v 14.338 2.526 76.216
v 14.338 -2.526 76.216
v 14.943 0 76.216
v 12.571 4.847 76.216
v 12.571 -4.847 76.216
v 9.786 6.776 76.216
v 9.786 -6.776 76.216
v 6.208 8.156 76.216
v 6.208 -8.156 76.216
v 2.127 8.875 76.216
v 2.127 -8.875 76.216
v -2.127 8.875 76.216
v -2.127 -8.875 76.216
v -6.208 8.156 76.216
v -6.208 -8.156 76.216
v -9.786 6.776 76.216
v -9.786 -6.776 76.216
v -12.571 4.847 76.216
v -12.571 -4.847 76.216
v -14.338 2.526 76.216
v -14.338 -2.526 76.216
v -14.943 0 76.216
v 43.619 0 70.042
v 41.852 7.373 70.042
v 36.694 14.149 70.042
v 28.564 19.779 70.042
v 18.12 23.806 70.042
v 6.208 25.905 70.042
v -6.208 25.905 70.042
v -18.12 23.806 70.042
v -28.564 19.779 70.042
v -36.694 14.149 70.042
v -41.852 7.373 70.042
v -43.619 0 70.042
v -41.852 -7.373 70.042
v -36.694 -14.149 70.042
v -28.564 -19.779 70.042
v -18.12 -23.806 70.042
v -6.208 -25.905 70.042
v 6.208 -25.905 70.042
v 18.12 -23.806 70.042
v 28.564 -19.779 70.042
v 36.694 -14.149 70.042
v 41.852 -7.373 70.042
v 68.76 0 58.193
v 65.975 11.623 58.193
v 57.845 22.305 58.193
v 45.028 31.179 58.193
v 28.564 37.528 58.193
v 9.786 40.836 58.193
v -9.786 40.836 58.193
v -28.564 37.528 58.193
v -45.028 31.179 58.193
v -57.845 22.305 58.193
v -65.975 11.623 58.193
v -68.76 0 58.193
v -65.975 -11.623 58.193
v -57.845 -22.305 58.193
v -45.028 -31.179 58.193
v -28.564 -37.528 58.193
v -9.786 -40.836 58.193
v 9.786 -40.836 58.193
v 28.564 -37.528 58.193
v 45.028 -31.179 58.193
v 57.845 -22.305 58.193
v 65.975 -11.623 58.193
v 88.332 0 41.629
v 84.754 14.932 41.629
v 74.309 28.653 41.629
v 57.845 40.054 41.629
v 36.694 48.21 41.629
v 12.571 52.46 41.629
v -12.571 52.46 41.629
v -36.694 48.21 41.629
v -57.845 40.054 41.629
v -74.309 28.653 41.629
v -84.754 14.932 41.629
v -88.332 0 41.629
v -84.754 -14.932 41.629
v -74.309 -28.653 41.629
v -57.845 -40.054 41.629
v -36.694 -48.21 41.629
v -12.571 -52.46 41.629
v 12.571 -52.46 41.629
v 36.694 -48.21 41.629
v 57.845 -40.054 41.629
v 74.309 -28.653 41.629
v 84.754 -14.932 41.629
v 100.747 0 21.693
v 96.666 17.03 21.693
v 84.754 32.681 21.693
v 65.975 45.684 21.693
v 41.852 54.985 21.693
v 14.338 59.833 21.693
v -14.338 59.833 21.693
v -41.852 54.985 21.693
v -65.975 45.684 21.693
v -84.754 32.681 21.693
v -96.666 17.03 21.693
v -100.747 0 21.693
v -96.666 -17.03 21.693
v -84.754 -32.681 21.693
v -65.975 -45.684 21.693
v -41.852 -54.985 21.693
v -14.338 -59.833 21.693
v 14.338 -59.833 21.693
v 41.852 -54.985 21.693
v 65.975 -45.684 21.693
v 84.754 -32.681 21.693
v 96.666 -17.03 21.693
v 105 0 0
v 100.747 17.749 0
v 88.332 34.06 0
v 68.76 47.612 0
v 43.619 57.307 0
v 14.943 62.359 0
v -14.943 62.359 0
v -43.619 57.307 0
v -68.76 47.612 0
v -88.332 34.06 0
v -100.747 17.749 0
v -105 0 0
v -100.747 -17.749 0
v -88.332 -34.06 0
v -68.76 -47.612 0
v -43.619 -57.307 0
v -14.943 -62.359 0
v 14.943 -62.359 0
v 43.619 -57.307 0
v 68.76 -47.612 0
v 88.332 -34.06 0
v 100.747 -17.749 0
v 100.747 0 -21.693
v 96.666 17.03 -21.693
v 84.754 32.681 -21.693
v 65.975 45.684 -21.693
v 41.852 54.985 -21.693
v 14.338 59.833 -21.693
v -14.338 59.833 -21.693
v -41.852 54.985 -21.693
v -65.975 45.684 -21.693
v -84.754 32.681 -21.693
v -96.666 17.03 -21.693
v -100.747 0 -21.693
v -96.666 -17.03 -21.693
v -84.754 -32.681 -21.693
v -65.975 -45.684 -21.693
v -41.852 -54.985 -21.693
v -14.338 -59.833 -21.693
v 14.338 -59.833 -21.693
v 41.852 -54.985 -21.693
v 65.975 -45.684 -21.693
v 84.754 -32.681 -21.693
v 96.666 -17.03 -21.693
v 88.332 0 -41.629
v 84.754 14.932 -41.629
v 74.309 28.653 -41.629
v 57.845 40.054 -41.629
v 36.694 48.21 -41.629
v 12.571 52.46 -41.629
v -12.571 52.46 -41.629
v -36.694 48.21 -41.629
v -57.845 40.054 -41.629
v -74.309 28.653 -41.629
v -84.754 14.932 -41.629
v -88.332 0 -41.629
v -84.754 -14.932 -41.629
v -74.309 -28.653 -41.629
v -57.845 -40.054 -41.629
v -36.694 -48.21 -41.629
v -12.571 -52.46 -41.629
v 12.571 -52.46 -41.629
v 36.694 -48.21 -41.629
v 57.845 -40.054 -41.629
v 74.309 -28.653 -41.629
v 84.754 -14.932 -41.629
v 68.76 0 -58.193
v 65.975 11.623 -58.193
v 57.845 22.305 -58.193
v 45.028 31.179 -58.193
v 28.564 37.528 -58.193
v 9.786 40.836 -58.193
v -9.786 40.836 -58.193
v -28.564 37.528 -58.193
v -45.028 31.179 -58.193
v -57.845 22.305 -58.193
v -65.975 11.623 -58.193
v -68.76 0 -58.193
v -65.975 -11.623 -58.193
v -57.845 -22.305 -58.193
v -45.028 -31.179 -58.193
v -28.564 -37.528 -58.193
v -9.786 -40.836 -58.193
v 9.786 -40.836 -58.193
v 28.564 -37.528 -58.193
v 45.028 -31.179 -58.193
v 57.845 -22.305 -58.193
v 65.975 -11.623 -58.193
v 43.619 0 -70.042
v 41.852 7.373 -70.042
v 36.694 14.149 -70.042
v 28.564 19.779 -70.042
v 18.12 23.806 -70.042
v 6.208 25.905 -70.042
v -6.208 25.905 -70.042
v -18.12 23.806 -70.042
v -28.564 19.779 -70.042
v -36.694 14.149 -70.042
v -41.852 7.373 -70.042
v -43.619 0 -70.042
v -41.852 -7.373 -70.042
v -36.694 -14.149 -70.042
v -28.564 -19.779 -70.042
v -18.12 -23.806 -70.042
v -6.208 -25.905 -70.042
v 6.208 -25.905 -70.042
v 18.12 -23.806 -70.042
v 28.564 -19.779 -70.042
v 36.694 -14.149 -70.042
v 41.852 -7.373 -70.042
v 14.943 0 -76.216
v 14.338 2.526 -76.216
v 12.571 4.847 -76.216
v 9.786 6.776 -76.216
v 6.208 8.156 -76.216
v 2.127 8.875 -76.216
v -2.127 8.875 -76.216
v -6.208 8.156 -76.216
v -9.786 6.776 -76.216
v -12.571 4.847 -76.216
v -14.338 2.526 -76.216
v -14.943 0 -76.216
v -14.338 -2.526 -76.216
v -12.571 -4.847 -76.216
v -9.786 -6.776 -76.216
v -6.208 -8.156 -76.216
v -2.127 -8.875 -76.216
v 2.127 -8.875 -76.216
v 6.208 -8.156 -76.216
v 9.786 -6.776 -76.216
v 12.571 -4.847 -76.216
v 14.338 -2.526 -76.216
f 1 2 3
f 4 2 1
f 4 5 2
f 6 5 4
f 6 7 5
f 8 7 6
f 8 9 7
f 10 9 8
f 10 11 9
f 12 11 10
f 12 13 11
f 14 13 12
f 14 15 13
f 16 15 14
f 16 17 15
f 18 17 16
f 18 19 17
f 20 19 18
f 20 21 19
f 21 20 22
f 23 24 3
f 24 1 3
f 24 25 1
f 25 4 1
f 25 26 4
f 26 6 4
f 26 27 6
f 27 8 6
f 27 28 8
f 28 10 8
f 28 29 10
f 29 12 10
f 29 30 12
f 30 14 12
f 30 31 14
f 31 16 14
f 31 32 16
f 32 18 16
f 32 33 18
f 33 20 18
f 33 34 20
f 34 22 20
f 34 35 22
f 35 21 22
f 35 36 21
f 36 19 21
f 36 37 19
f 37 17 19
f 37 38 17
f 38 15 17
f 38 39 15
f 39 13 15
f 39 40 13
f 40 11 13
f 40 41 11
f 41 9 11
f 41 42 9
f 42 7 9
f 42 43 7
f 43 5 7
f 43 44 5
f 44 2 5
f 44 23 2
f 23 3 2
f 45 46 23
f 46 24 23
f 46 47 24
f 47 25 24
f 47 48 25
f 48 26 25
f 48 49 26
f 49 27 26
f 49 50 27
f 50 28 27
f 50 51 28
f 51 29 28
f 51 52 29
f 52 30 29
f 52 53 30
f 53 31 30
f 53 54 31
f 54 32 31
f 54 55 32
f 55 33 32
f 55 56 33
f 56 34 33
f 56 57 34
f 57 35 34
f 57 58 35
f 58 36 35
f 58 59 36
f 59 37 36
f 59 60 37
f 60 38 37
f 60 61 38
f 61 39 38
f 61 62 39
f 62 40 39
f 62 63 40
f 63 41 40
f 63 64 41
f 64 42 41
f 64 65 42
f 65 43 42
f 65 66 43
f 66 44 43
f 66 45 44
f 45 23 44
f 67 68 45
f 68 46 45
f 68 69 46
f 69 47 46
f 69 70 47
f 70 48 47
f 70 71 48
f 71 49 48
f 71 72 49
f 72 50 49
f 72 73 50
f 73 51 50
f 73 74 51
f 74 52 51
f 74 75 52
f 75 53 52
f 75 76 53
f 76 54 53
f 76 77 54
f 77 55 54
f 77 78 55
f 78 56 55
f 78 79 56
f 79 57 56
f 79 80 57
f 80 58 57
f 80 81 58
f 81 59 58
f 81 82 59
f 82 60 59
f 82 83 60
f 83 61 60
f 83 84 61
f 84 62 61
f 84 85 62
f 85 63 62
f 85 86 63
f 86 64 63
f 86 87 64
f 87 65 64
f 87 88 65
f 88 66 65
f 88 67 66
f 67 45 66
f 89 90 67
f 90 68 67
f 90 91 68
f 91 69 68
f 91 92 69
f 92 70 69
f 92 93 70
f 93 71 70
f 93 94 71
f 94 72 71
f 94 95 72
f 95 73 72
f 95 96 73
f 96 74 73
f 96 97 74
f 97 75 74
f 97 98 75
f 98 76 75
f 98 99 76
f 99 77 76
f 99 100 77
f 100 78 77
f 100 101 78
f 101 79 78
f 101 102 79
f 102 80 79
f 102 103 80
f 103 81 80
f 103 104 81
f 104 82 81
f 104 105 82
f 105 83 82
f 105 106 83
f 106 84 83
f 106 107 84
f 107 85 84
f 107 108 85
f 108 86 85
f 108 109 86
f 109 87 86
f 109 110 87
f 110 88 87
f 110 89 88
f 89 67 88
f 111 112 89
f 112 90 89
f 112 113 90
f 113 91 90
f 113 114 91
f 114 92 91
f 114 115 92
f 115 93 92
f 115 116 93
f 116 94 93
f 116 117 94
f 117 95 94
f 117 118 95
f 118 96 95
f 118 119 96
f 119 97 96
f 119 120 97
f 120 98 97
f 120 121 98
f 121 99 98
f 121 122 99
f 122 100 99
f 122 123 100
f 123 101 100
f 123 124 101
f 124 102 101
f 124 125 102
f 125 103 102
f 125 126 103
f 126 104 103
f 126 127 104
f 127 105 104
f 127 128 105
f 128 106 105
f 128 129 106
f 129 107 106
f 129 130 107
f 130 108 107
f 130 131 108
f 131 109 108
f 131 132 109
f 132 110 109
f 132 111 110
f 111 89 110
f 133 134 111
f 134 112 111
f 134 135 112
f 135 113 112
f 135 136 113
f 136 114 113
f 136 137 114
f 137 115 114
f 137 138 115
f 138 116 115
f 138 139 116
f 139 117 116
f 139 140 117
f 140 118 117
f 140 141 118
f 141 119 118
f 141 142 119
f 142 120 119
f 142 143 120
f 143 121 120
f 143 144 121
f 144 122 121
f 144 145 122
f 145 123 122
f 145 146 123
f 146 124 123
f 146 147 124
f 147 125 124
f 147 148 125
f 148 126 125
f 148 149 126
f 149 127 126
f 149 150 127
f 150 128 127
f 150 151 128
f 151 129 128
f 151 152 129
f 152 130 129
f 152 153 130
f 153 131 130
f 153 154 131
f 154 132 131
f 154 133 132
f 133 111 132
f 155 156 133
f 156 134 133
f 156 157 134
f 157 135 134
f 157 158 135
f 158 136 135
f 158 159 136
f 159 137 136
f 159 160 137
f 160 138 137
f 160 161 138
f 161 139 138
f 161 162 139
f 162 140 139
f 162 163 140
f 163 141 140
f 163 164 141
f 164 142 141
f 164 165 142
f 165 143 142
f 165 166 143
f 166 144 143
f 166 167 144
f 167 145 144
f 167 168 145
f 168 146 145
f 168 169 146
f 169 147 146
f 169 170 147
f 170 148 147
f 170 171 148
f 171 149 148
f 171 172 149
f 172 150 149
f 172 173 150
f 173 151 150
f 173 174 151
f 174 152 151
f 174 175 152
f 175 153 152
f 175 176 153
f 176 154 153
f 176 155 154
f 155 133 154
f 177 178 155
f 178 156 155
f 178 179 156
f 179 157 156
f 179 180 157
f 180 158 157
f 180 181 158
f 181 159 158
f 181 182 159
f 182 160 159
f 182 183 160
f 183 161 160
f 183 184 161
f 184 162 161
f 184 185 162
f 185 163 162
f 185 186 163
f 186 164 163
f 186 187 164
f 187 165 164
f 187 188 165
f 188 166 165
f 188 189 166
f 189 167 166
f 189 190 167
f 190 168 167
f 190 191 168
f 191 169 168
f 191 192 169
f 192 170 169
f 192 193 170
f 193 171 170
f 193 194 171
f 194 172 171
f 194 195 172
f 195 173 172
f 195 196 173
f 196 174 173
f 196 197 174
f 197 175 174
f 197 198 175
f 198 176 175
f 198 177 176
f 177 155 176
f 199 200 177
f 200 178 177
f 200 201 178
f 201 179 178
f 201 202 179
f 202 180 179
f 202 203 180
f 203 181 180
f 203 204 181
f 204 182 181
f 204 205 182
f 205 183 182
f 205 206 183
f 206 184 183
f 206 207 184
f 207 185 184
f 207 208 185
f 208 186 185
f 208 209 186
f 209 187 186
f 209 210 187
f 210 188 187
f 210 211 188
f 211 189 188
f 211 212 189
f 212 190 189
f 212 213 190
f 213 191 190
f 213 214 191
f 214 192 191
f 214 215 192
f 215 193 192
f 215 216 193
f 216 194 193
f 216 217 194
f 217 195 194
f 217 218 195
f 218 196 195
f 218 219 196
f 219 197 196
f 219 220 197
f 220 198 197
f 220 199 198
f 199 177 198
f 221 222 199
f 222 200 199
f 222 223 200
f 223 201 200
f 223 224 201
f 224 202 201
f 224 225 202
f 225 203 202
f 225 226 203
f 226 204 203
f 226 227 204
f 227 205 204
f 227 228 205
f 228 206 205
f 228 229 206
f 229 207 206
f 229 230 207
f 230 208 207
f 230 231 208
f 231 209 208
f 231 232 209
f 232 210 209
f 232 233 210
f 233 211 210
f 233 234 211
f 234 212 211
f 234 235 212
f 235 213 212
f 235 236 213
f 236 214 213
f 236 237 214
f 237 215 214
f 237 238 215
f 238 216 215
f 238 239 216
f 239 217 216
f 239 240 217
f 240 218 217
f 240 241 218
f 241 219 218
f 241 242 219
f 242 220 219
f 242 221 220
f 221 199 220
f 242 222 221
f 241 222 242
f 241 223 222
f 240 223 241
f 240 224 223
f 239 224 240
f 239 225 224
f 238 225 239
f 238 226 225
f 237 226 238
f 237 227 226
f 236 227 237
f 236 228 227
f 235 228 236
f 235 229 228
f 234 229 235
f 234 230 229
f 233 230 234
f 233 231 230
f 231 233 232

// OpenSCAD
// Generated by SolidPython 1.0.1 on 2020-07-29 00:46:52


scale(v = [15, 9, 11]) {
	sphere(r = 7);
}
/***********************************************
*********      SolidPython code:      **********
************************************************
 
# import packages: SolidPython
from solid import *
from solid.utils import *
from itertools import chain, combinations, permutations


class Resize:

    def __init__(self, scad_file):
        self.scad_file = scad_file
        #self.scad_file = import_scad(scad_file)
        # cone/cylinder param:
        self.r1 = 0
        self.r2 = 0
        self.h = 0
        # rectangular prism param:
        self.w = 0
        self.l = 0
        # ellipse param:
        self.r = 0

    # import OpenScad code (file name corresponds to shape)


    # classify shape + parameters
    def assign(self, param1, param2, param3):
        if self.scad_file == 'cone.scad':
            self.r1 = param1
            self.r2 = param2
            self.h = param3
        elif self.scad_file == 'cylinder.scad':
            self.r1 = param1
            self.r2 = param2
            self.h = param3
        elif self.scad_file == 'rectangularPrism.scad':
            self.h = param1
            self.l = param2
            self.w = param3
        else:
            self.r = param1
            self.h = param2

    # resize parameters
    def iterate(self):
        x = range(3, 20, 2)
        i = 1
        if self.scad_file == 'cone.scad':
            tempList = list(permutations(x, 2))
            for temp in tempList:
                param1 = temp[0]
                param2 = temp[1]
                filepath = 'produced_scad_files/' + 'cone' + str(param1) + '_' + str(param2) + '_' + '.scad'
                scad_render_to_file(cylinder(h=param1, r1=param2, r2=0), filepath)

        elif self.scad_file == 'cylinder.scad':
            tempList = list(permutations(x, 3))
            for temp in tempList:
                param1 = temp[0]
                param2 = temp[1]
                filepath = 'produced_scad_files/' + 'cylinder' + str(param1) + '_' + str(param2) + '_' + '.scad'
                scad_render_to_file(cylinder(h=param1, r1=param2, r2=param2), filepath)

        elif self.scad_file == 'rectangularPrism.scad':
            tempList = list(permutations(x, 3))
            for temp in tempList:
                param1 = temp[0]
                param2 = temp[1]
                param3 = temp[2]
                filepath = 'produced_scad_files/' + 'rectangularPrism' + str(param1) + '_' + str(param2) + '_' + str(
                    param3) + '.scad'
                scad_render_to_file(cube(size=(param1, param2, param3)), filepath)

        elif self.scad_file == 'ellipse.scad':
            tempList = list(permutations(x, 4))
            for temp in tempList:
                param1 = temp[0]
                param2 = temp[1]
                param3 = temp[2]
                param4 = temp[3]
                filepath = 'produced_scad_files/' + 'ellipse' + str(param1) + '_' + str(param2) + '_' + str(param3) + '_' + str(param4) + '.scad'
                scad_render_to_file(scale([param1, param2, param3])(sphere(r=param4)), filepath)

    def render_to_scadfile(self):
        scad_render_to_file(scad, 'example.scad') 
 
************************************************/
